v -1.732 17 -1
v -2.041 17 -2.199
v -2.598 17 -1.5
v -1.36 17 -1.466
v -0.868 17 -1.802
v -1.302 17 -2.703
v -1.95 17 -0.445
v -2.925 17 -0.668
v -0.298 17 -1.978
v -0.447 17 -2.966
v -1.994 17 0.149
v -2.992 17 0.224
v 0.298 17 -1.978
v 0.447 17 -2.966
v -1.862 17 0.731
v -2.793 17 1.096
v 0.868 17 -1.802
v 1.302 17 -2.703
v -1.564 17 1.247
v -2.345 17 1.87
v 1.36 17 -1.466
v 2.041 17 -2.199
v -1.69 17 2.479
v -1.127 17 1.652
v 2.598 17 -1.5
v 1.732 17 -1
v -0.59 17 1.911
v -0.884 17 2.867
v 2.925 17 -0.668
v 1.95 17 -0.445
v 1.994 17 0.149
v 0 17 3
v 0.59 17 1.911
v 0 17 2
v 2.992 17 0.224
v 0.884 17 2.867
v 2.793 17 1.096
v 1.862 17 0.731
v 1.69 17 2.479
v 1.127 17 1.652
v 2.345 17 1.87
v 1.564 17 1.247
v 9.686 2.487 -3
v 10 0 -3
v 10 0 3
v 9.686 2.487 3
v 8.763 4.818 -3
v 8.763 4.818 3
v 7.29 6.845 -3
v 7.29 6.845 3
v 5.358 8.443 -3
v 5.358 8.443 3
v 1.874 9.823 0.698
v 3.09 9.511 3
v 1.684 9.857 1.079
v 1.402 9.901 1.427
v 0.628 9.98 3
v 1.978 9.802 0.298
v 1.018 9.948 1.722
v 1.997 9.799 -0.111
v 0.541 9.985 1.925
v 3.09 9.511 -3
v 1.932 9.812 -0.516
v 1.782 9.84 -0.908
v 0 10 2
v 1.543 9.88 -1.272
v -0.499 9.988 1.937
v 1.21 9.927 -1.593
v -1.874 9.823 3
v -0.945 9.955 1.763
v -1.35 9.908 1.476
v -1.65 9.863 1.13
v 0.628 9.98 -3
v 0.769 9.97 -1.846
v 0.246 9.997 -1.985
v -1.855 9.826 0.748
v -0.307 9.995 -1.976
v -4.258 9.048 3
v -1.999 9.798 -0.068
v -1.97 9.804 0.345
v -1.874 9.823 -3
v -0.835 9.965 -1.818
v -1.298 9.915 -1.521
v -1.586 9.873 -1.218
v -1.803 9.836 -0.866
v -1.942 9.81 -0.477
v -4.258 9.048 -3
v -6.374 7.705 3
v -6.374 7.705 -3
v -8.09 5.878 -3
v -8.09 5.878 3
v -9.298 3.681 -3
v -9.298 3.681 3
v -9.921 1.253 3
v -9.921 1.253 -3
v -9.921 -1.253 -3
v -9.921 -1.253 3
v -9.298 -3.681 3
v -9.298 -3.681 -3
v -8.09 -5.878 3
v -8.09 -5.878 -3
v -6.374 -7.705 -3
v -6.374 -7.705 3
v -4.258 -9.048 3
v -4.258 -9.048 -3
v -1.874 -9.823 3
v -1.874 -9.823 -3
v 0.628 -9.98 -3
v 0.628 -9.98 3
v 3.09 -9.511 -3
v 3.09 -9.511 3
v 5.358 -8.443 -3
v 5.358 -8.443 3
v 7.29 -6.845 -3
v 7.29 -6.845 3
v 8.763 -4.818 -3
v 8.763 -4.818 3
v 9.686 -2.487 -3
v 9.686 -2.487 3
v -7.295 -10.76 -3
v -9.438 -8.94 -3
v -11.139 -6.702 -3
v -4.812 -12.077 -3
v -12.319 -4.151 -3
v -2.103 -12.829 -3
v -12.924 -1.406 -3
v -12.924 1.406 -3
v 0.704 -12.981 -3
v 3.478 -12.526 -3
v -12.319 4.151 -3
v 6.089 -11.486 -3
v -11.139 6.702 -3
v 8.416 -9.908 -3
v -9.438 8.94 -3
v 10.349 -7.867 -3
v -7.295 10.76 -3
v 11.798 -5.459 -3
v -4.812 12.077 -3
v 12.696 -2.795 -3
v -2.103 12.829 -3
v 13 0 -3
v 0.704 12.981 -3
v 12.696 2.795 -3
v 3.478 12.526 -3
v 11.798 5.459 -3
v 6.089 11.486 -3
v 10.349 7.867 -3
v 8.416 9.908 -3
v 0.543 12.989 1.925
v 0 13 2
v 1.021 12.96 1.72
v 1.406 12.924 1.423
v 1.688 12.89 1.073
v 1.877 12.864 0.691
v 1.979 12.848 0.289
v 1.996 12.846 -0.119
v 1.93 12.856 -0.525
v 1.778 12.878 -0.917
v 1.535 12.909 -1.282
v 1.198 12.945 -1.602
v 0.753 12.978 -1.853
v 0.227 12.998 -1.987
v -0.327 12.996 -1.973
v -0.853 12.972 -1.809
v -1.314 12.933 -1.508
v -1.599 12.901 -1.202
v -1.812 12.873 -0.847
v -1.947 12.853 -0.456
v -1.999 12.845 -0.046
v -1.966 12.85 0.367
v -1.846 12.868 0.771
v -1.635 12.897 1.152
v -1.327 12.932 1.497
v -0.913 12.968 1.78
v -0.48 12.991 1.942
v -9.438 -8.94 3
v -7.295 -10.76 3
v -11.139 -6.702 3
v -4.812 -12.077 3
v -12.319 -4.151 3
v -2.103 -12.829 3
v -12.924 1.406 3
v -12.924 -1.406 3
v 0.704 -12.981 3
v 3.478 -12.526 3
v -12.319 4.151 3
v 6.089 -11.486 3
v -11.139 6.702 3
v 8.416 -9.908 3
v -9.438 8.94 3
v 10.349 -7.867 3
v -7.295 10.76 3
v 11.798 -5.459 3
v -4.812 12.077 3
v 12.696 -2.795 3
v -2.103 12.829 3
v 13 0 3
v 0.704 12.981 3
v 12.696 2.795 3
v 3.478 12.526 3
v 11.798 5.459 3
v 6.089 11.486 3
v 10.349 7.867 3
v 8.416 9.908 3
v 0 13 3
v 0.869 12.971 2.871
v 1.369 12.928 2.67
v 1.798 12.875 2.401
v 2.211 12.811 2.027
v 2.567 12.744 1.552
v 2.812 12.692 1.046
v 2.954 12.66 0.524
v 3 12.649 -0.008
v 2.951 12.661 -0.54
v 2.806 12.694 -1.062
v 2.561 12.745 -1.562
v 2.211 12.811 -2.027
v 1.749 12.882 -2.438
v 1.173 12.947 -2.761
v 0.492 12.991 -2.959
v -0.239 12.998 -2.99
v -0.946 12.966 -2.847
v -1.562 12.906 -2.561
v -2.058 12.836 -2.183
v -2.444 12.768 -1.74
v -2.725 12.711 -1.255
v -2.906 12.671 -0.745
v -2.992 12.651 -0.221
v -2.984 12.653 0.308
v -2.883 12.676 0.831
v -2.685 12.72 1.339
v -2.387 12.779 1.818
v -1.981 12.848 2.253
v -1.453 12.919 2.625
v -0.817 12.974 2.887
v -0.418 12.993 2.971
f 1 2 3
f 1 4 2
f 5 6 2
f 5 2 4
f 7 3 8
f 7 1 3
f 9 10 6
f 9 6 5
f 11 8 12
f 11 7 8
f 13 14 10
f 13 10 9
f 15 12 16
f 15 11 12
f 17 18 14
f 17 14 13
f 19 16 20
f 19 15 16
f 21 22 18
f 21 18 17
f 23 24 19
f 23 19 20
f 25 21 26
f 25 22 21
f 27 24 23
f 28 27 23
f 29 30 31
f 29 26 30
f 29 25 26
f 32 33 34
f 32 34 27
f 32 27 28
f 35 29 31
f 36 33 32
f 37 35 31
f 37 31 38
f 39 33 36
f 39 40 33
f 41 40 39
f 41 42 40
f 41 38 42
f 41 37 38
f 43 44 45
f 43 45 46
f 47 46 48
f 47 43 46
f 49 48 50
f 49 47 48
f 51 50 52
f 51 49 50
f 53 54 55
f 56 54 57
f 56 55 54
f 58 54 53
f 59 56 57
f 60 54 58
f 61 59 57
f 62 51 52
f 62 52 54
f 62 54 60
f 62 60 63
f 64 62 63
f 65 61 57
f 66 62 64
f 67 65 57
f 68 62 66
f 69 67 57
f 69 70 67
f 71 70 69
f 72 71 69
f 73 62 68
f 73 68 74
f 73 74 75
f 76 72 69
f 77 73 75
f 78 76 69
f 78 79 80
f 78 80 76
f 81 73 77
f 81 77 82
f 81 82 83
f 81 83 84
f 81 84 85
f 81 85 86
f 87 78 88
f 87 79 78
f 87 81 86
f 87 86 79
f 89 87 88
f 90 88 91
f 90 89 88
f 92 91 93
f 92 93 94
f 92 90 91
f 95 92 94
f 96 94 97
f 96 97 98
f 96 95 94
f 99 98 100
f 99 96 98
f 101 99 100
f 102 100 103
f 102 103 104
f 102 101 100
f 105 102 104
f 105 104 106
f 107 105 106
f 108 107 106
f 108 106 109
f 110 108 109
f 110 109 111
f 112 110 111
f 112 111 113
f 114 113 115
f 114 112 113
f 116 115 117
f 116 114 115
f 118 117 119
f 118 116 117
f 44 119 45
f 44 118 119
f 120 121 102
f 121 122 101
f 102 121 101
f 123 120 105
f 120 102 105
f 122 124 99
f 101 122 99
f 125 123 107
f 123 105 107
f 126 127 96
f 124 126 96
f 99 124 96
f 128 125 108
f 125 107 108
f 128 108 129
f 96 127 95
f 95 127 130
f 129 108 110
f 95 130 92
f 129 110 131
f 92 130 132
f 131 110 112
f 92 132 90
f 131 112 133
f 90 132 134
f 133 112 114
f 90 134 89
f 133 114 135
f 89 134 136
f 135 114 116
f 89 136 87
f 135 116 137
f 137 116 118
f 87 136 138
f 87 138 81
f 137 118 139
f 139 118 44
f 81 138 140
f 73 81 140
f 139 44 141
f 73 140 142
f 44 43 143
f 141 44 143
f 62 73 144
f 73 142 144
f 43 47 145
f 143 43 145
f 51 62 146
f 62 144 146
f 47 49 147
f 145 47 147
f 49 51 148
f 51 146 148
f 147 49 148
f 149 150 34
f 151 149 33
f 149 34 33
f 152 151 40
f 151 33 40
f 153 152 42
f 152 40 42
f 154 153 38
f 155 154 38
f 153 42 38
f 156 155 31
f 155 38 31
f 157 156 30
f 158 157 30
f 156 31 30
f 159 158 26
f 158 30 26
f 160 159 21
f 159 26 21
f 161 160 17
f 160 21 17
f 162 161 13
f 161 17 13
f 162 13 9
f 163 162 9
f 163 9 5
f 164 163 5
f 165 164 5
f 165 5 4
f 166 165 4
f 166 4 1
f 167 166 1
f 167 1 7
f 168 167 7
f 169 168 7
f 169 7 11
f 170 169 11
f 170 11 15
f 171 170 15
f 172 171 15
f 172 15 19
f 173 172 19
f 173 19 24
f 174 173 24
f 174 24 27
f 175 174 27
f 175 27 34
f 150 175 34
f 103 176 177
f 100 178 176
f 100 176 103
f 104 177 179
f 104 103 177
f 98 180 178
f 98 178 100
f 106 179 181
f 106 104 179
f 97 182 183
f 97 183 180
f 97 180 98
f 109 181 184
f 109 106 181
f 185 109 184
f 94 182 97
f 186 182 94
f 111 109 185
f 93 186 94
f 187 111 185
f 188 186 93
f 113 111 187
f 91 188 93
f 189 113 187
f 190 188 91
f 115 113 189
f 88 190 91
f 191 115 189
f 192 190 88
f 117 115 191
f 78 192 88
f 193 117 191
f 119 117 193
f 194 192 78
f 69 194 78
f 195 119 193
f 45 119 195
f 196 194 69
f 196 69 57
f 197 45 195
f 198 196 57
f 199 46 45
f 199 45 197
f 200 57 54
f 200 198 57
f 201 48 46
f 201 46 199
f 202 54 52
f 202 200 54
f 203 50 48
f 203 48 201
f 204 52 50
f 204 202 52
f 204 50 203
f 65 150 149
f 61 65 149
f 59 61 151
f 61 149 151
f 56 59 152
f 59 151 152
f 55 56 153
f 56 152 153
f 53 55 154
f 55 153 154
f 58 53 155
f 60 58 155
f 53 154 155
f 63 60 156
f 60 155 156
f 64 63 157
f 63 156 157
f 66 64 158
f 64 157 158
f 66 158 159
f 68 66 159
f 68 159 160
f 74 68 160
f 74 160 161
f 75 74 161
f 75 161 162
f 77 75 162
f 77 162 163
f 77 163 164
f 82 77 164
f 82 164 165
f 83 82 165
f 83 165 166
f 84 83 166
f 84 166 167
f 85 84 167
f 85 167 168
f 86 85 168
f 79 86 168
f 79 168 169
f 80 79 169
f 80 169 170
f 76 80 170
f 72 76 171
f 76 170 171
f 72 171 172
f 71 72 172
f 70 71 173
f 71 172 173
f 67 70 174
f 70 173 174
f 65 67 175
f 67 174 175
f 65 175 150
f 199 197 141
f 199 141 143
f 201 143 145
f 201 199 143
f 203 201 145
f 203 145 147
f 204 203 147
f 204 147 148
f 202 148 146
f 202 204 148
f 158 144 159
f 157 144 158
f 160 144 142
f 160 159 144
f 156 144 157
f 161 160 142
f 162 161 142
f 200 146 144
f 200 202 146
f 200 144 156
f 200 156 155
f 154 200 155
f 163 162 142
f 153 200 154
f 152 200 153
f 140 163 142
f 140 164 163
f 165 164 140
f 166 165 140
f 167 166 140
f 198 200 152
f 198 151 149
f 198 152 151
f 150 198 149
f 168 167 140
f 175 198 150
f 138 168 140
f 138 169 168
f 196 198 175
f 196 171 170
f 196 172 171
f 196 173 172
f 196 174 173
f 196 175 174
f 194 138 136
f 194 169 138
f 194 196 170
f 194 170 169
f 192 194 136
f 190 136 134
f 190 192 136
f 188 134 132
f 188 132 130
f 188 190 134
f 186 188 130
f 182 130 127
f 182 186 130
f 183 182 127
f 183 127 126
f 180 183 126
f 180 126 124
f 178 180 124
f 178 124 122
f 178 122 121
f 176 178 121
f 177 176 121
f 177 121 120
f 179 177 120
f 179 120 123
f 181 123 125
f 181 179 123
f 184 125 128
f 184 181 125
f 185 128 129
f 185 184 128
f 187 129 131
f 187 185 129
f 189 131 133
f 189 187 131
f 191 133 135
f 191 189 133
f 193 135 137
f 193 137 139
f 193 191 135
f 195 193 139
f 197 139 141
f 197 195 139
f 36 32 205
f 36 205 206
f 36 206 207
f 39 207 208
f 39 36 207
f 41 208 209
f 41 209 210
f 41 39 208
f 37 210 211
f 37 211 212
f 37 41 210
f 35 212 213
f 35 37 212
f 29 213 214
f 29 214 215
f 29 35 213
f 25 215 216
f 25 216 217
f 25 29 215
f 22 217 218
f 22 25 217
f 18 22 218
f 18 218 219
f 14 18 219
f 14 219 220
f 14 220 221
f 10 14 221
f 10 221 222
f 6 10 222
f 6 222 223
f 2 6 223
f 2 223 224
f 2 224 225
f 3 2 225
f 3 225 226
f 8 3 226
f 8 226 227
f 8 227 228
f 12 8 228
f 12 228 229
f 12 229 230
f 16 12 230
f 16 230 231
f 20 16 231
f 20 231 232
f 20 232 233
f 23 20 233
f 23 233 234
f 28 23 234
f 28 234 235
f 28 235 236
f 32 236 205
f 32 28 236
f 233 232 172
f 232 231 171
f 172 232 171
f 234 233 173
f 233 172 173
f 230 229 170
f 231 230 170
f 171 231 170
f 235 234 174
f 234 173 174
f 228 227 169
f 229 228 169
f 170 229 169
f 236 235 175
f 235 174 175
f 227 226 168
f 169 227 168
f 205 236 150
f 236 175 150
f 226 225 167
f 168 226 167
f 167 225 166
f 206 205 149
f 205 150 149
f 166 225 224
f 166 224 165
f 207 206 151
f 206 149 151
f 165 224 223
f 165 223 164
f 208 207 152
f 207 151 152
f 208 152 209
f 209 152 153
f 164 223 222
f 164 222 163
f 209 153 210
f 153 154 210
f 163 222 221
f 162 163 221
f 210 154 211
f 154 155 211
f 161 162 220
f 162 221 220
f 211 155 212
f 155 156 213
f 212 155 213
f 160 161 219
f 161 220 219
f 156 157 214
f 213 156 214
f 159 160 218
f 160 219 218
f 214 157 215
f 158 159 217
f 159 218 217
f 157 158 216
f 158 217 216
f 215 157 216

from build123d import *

# Parameters (mm, degrees)
SKETCH1_R                = 13
SKETCH1_R_2              = 10
BOSS_EXTRUDE1_DEPTH      = 3
BOSS_EXTRUDE2_REACH      = 37.628
BOSS_EXTRUDE2_END_RADIUS = 13
BOSS_EXTRUDE2_START      = 17
SKETCH2_R                = 3
SKETCH3_R                = 2
CUT_EXTRUDE1_DEPTH       = 10


with BuildPart() as part:
    # Sketch1 → Boss-Extrude1 (new, symmetric)
    with BuildSketch(Plane.XY):
        Circle(SKETCH1_R)
        Circle(SKETCH1_R_2, mode=Mode.SUBTRACT)
    extrude(amount=BOSS_EXTRUDE1_DEPTH, both=True)


with BuildPart() as body_2:
    # Boss-Extrude2: up to this cylinder (the profile starts outside it)
    boss_extrude2_end = Plane(origin=(0, 0, 0), z_dir=(0, 0, -1)) * Cylinder(BOSS_EXTRUDE2_END_RADIUS, 102.256, mode=Mode.PRIVATE)
    # Sketch2 → Boss-Extrude2 (new, up to the surface)
    with BuildSketch(Plane(origin=(0, 0, 0), x_dir=(1, 0, 0), z_dir=(0, 1, 0)).offset(BOSS_EXTRUDE2_START), mode=Mode.PRIVATE) as boss_extrude2_sk1:
        with Locations(Location((0, 0, 0), (0, 0, 270))):
            Circle(SKETCH2_R)
    boss_extrude2_tool1 = extrude(boss_extrude2_sk1.sketch, amount=-BOSS_EXTRUDE2_REACH, mode=Mode.PRIVATE) - boss_extrude2_end
    add(boss_extrude2_tool1.solids().sort_by_distance((0, 17, 0))[0])


with BuildPart() as cut_extrude1_tool:
    # Sketch3 → Cut-Extrude1 (new body)
    with BuildSketch(Plane(origin=(0, 17, 0), x_dir=(1, 0, 0), z_dir=(0, 1, 0))):
        with Locations(Location((0, 0, 0), (0, 0, 270))):
            Circle(SKETCH3_R)
    extrude(amount=-CUT_EXTRUDE1_DEPTH)


with BuildPart() as part_1:
    add(part.part)

    # Cut-Extrude1: cut by cut_extrude1_tool
    add(cut_extrude1_tool.part, mode=Mode.SUBTRACT)


with BuildPart() as body_2_1:
    add(body_2.part)

    # Cut-Extrude1: cut by cut_extrude1_tool
    add(cut_extrude1_tool.part, mode=Mode.SUBTRACT)


solid = Compound([part_1.part, body_2_1.part])
